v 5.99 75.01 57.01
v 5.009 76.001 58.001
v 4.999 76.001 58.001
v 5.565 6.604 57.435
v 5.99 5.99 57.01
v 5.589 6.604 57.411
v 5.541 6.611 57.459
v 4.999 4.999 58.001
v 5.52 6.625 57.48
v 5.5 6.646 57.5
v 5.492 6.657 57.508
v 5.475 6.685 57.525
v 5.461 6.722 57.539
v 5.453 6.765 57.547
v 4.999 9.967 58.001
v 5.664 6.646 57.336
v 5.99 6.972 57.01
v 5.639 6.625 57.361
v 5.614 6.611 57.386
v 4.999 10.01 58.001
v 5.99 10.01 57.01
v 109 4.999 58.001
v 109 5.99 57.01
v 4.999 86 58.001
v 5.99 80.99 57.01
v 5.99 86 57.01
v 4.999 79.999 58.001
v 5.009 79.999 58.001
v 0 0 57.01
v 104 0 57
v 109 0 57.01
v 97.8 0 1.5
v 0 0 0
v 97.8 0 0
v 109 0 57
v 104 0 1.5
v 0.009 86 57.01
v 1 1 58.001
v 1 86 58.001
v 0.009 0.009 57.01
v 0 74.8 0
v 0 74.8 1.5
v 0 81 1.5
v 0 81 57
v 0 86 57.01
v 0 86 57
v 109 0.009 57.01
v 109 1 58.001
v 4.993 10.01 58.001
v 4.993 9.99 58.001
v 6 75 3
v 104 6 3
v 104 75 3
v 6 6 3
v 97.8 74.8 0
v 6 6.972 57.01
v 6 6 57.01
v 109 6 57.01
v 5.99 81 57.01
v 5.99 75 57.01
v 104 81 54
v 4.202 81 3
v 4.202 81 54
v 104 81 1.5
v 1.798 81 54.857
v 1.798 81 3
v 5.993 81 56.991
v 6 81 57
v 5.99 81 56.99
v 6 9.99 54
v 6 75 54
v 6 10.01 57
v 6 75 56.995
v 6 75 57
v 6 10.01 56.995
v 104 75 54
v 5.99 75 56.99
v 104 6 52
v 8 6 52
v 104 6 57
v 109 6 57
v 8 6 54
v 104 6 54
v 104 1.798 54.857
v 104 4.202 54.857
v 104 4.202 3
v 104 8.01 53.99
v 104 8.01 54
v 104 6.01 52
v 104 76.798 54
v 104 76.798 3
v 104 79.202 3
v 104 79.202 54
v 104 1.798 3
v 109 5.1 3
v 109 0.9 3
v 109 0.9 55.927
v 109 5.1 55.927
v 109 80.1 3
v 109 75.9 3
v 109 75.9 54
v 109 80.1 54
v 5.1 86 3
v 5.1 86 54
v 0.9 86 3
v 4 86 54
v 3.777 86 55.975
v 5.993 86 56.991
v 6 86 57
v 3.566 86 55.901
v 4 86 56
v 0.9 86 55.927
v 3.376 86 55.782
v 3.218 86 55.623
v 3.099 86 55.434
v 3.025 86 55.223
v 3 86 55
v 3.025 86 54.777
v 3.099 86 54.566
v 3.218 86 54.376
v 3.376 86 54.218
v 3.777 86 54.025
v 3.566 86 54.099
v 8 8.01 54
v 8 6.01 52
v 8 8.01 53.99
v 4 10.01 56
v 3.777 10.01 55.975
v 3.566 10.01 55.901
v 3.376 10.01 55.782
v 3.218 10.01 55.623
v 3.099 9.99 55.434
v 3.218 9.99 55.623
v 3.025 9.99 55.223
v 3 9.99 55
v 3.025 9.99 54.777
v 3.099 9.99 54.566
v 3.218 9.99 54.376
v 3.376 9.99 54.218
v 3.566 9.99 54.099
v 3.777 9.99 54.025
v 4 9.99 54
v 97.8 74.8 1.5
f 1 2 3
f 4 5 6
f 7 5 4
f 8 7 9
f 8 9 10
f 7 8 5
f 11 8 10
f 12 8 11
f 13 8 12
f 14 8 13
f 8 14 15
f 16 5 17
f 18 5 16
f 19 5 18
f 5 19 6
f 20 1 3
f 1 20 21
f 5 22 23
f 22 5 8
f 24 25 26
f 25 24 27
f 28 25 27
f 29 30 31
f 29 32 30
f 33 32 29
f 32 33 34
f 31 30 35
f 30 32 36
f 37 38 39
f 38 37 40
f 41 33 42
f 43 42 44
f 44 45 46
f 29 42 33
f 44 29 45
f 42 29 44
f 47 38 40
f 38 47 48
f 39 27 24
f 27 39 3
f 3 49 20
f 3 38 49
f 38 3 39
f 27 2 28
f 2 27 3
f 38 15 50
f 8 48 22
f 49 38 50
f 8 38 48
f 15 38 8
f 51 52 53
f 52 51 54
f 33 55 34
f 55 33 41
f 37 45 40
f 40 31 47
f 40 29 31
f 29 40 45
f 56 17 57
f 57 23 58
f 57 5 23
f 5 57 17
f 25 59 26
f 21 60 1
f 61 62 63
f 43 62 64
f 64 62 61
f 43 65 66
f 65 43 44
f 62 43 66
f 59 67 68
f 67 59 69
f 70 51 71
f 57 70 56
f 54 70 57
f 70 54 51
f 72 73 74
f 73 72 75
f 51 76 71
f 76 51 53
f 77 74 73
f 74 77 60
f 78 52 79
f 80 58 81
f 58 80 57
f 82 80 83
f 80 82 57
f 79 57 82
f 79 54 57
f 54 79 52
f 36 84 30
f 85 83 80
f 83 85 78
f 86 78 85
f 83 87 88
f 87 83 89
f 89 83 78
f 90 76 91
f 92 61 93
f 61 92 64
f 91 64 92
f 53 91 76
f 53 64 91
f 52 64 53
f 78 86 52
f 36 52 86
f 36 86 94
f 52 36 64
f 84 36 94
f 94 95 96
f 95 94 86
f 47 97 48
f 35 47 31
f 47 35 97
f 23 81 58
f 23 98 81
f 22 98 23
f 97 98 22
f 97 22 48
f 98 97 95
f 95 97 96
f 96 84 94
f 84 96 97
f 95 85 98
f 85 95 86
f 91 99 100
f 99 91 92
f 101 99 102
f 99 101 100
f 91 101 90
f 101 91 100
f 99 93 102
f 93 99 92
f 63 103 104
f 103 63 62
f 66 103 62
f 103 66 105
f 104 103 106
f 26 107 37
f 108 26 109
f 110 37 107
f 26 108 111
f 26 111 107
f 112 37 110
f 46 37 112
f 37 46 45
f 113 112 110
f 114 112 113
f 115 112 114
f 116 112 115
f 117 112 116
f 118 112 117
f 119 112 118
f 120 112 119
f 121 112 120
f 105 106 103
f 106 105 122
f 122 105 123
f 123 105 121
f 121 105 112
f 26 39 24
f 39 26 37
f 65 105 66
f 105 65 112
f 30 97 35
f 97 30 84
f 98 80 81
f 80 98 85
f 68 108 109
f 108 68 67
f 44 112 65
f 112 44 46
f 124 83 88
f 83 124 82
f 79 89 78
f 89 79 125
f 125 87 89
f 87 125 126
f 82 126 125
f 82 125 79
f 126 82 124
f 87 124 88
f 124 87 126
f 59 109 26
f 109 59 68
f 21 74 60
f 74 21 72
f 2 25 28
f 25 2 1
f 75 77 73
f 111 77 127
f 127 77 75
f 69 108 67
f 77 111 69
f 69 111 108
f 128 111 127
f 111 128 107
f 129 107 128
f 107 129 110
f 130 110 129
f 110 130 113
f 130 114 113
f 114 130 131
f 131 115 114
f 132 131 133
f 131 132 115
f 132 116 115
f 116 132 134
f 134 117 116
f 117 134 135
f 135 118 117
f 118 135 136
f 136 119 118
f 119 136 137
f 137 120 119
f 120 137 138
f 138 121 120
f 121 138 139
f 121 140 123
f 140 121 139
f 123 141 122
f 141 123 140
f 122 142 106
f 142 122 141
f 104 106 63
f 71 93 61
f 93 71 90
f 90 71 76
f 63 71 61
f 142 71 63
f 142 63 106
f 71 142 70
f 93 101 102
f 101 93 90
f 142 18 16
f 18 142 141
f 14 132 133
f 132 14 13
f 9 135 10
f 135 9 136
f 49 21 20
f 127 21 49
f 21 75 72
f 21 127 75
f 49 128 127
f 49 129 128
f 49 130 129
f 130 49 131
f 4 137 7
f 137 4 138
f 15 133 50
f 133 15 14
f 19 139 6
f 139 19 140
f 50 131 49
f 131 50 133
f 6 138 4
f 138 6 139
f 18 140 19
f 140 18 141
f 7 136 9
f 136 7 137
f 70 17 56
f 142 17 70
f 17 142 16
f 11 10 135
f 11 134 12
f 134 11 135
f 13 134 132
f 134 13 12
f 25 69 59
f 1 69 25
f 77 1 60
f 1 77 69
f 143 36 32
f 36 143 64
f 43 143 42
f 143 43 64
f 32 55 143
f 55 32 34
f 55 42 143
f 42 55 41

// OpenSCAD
// ============================================================================
// cutlery_box.scad
// Graduated 3-chamber disposable-cutlery box (Option 3) — CUT-FROM-SOLID port
// of build_box.py, for a 120 x 120 x 120 mm printer (AOSEED).
//
// WHY THIS PORT EXISTS (the whole point):
//   The hand-mesh generator (build_box.py) could not keep the 1 mm rim chamfer
//   continuous across the female dovetail joints, because where a slot's flared
//   corner crosses the sloped chamfer it needs a true boolean intersection.
//   OpenSCAD HAS that boolean kernel, so here we do exactly the "cut-from-solid"
//   thing:
//      1. Build the ENTIRE box as ONE solid, WITH the chamfer already on it.
//      2. difference() out vertical dovetail prisms ( /_\ cross-section ),
//         running from just above the base plate up THROUGH the rim, to both
//         (a) form the sliding-dovetail joints, and
//         (b) split the box into 6 bed-sized pieces.
//   Because the cut is a real boolean through the already-chamfered solid, the
//   sloped chamfer<->slot edge is produced for free => the rim chamfer stays
//   CONTINUOUS across every joint, with none of the sliver hacks.
//
// ----------------------------------------------------------------------------
// HOW TO USE
//   In the app:  set `part` below (or use the Customizer dropdown), F5 to
//                preview, F6 to render, then File > Export > STL.
//   One piece (CLI):
//      openscad -o body_knife_A.stl -D 'part="knife_A"' cutlery_box.scad
//   ALL SIX (bash, run from this folder):
//      for p in knife_A knife_B fork_A fork_B spoon_A spoon_B; do \
//        openscad -o "body_$p.stl" -D "part=\"$p\"" cutlery_box.scad ; done
//   PNG preview of one piece:
//      openscad -o knife_B.png --imgsize=1400,1000 --autocenter --viewall \
//        -D 'part="knife_B"' cutlery_box.scad
//
//   Pieces are modelled in ASSEMBLED coordinates (floor-down, z=0 is the bed),
//   so importing all six STLs together shows the assembled box directly; your
//   slicer will auto-drop each one onto the plate for printing.
//
// BED SANITY: every piece is <= 120 mm in X, Y, Z.
//   Z = 58 mm. Widest piece = spoon at 117 mm (Y). A-halves reach 109 mm (X,
//   including the protruding dovetail key). All under 120.
//
// !! I could NOT run OpenSCAD to verify this file (no binary in my sandbox) !!
//   - The rim chamfer is a SMOOTH, true-45 bevel built from hull() frustums of
//     convex rectangles. Works in every OpenSCAD since ~2015 (incl. Homebrew
//     2021.01). No stepped staircase -- and, crucially, it makes box() a clean
//     well-formed solid so the per-part booleans resolve reliably (the old
//     14-slice staircase was fragile and CGAL was dropping the walls of the
//     interior parts, leaving only the key prisms => "floating boxes").
//   - roof() is still available behind USE_ROOF=true for those who have it
//     (2021.01+ snapshots); for THIS rectangular design it is identical, so it
//     is NOT required.
//   - After F6, check the console for "WARNING"/"not a valid 2-manifold".
//     If a tenon ever looks detached, bump EPS to 0.05.
// ============================================================================


/* [Part to render / export] */
part = "knife_A"; // [knife_A, knife_B, fork_A, fork_B, spoon_A, spoon_B, assembly]

/* [Chamfer method] */
// false = smooth hull() frustum bevel (default, any OpenSCAD); true = roof() (2021.01+)
USE_ROOF = false;

/* [Heights (mm)] */
BASE   = 3.0;     // floor / base-plate thickness
COMP_H = 55.0;    // interior wall height above the floor (cutlery stack depth)

/* [Walls (mm)] */
HOST_T   = 6.0;     // thickness of every wall (thick enough to host a dovetail)
HALF_LEN = 104.0;   // printed length of each half (A = near, B = far); <120 incl. key

/* [Chamber bays (mm)] */
N_COL     = 3;       // columns of cutlery per chamber
KNIFE_COL = 23.0;    // -> knife bay 69  (3 x 19 mm knives + play)
FORK_COL  = 33.0;    // -> fork  bay 99  (3 x 29 mm forks  + play)
SPOON_COL = 37.0;    // -> spoon bay 111 (3 x 34 mm spoons + play, trimmed <120)

/* [Dovetail joint (mm)] */
DT_DEPTH = 5.0;   // tail protrusion past the seam (male key depth)
DT_NECK  = 1.2;   // half-width at the seam face (narrow)
DT_FLARE = 2.1;   // half-width at the tip (wide -> locks)
DT_CLR   = 0.4;   // FLANK/seam slide clearance added to the female socket (do not change for fit)
DT_DEPTH_RELIEF = 0.3; // extra depth on the socket BACK only, so the tail tip never bottoms out

/* [Hidden-dovetail top cap / "hat" (mm)] */
// The dovetail otherwise shows its trapezoid outline on the TOP edge of the wall.
// To hide it, the MALE piece extends the wall's full-width top (chamfer included)
// across the key footprint -> a flush, continuous top. The FEMALE piece gets a
// matching top RECESS (cap footprint + CAP_CLR) so the cap drops straight in.
// Result: the top reads as one surface with a single straight seam line at the cap
// tip; the dovetail joinery lives entirely below the cap.
//
// SELF-SUPPORTING UNDERSIDE: the cap reaches the FULL wall width at the chamfer base
// (so the top edge reads as the wall extended, with NO recessed sliver on the outer
// face), and its underside is ONE planar ramp from the chamfer's OUTER CORNER
// (half-width HOST_T/2 at z = BODY_H-CHAMFER) down to the dovetail-neck half-width
// (CAP_FOOT) at CAP_SLANT_DEG from horizontal. No little horizontal step. The ramp
// reaching full width exactly at the chamfer base means "ramp top" == "chamfer base"
// (CAP_H is DERIVED). The FEMALE recess is the same ramp + CAP_CLR play.
// TRADEOFF: because the cap runs all the way to the outer corner, the female wall
// tapers to ~0 at z = BODY_H-CHAMFER -> a thin feather edge at the joint (gradual at
// CAP_SLANT_DEG, hidden inside the joint when assembled). Accepted per design intent.
CAP_SLANT_DEG = 50;     // cap underside ramp angle from horizontal (50 = self-supporting, long flare)
CAP_FOOT = DT_NECK;     // cap-underside half-width where it meets the dovetail neck
CAP_CLR = 0.3;          // slide clearance so the male cap seats into the female top recess

/* [Rim chamfer (mm)] */
CHAMFER = 1.0;    // 45-deg comfort break broken along the top wall edges

/* [Base half-lap / anti-warp (mm)] */
// Neighbouring base plates overlap as a HORIZONTAL half-lap (shiplap) at mid-base
// height, so corners stay coplanar (no lift/protrusion). Horizontal lap faces do
// NOT bind the vertical-drop assembly. Shingle direction: A->B and knife->fork->spoon.
LAP_LEN = 6;        // overlap past the A/B seam and the knife/fork seam
LAP_LEN_FS = 2;     // overlap past the fork/SPOON seam -- SMALLER: spoon is the
                    // tightest piece (117mm of the 120mm bed); a 6mm lap there
                    // would push spoon to 123mm. 2mm keeps spoon at 119mm.
LAP_Z   = BASE/2;   // 1.5 -- horizontal split height of the lap (bottom vs top half)
LAP_CLR = 0.2;      // in-plane clearance so the shelf isn't a press fit

/* [Lid — box features that receive a flat ORDERED clear sheet] */
// The lid itself is NOT printed: it's a flat ~2 mm PETG/Tritan sheet, bullnose-polished
// edges (r=LID_EDGE_R), ordered to size. We only model the box features that receive it.
LID_T            = 2.0;   // ordered sheet thickness
LID_EDGE_R       = 1.0;   // ordered sheet bullnose edge radius (for the sheet order spec)
LID_PLAY         = 0.4;   // total vertical play in the hinge groove (sheet + this)
LID_RECESS       = 2.0;   // lid TOP sits this far BELOW the rim, so the journal pocket is fully
                          // capped (rim caps the bullnose -> retains the lid when raised; tilt-in)
HINGE_AT_MINUS_X = true;  // hinge on the -x (303mm) end wall; clip on +x. (flip = mirror; default delivered)
// perimeter support ledge (lid underside rests on it at z = BODY_H-LID_T)
LEDGE_W          = 2.0;   // ledge inward protrusion (its underside ramps back at 45 deg -> self-supporting)
GROOVE_END_INSET = 0.0;   // groove reaches the corners but RUNS OUT smoothly there (no end-face / no
                          // exposed bore); GROOVE_TAPER sets the run-out length
GROOVE_TAPER     = 4.0;   // y-length over which the eased mouth tapers out at each groove end
// hinge journal (cut into the inner face of the hinge end wall, CONTINUOUS along the long edge)
GROOVE_DEPTH     = 3.0;   // 2mm lead-in slot + 1mm pocket radius -> journal sits 2mm back from the
                          // face so its cap clears the swing relief and RETAINS the lid
GROOVE_POCKET_R  = 1.0;   // journal half-cylinder radius (the bullnose sheet edge rolls in it)
// clip latch (one localized retainer, centered on the clip end wall)
CLIP_W           = 18.0;  // clip width
CLIP_LIP         = 0.4;   // retaining overhang (0.3 light .. 0.6 firm)
CLIP_RAMP_H      = 1.6;   // cam-ramp height above the rim (press-to-close)
// finger scallop (semicircular dish in the rim, centered on & aligned with the clip)
SCALLOP_W        = 16.0;  // scallop width
SCALLOP_DEPTH    = 6.0;   // how far it dishes down from the rim


/* [Hidden] */
EPS      = 0.01;          // tiny overlap so abutting solids fuse cleanly in CGAL
// Upper-chamber pieces (fork, spoon) were cut by a cell plane laid EXACTLY on the
// divider wall's far face (the lower chamber owns that wall). intersection() along a
// plane coincident with an existing box face makes CGAL leave a ZERO-THICKNESS copy
// of the wall face -> edge-manifold + "watertight" but degenerate (OpenSCAD shows it
// as a blue back-face; Tinkercad thickens it into a phantom block). SEAM_EPS nudges
// those cut planes a hair INTO the open bay so they no longer coincide with any box
// face -> no flap. 0.02 mm is physically nothing but is well clear of CGAL's tolerance.
SEAM_EPS = 0.02;
CUT_OVER = 1.0;           // how far dovetail cutters overshoot the rim (clean cut)

BODY_H    = BASE + COMP_H;     // 58  total height
END_WALL  = HOST_T;            // end walls are dovetail hosts too -> equally thick
TOTAL_LEN = 2 * HALF_LEN;      // 208 assembled length (end wall .. end wall)

// hidden-cap ramp geometry (derived).
//   CAP_HW    = cap MAX half-width = HOST_T/2 (the full wall edge) at the chamfer base.
//   CAP_RISE  = vertical height of the self-supporting CAP_SLANT_DEG underside ramp.
//   CAP_ZRAMP = where the cap reaches full width = the chamfer base (BODY_H-CHAMFER), so
//               the ramp runs straight to the chamfer OUTER CORNER (no horizontal step).
//   CAP_ZBOT  = cap bottom = ramp start; CAP_H derived from it (for reference/report).
//   CAP_ZRAMP_R = recess ramp top, shifted down by CAP_CLR so the recess ramp stays
//               parallel to the cap ramp with uniform play.
CAP_HW      = HOST_T/2;   // cap reaches the FULL wall edge at the chamfer base
CAP_RISE    = (CAP_HW - CAP_FOOT) * tan(CAP_SLANT_DEG);
CAP_ZRAMP   = BODY_H - CHAMFER;               // full width exactly at the chamfer base / outer corner
CAP_ZBOT    = CAP_ZRAMP - CAP_RISE;
CAP_H       = BODY_H - CAP_ZBOT;              // derived; reported
CAP_ZRAMP_R = CAP_ZRAMP;   // recess ramp ALSO tops at the chamfer corner (mirror the cap) -> no vertical lip
// sanity checks
assert(CAP_ZBOT > BASE + 1,
       "cap zone dips too low -- raise CAP_SLANT_DEG");
assert(CAP_HW >= DT_FLARE,
       "cap too narrow to cover the dovetail tail");

// NOTE: lid-derived constants are defined BELOW the Y-layout block, because some of
// them (INTERIOR_Y0/Y1, CLIP_CY) depend on OUTER_L / OUTER_R / EXT_W. See "lid derived".

// bay widths
KNIFE_BAY = N_COL * KNIFE_COL; // 69
FORK_BAY  = N_COL * FORK_COL;  // 99
SPOON_BAY = N_COL * SPOON_COL; // 111

// ---- Y layout (width direction): wall | bay | divider | bay | divider | bay | wall
KNIFE_Y0 = 0;
KNIFE_Y1 = HOST_T + KNIFE_BAY + HOST_T;        // 0..81   (outer wall + bay + divider)
FORK_Y0  = KNIFE_Y1;                           // 81
FORK_Y1  = FORK_Y0 + FORK_BAY + HOST_T;        // 81..186 (bay + divider)
SPOON_Y0 = FORK_Y1;                            // 186
SPOON_Y1 = SPOON_Y0 + SPOON_BAY + HOST_T;      // 186..303(bay + outer wall)
EXT_W    = SPOON_Y1;                           // 303 total width

// lengthwise wall Y-bands [y0,y1] (host the A/B dovetails) + their centers
OUTER_L  = [0, HOST_T];                                       // [0,6]    c=3
DIV_KF   = [HOST_T + KNIFE_BAY, HOST_T + KNIFE_BAY + HOST_T]; // [75,81]  c=78
DIV_FS   = [FORK_Y0 + FORK_BAY, FORK_Y0 + FORK_BAY + HOST_T]; // [180,186]c=183
OUTER_R  = [SPOON_Y1 - HOST_T, SPOON_Y1];                     // [297,303]c=300

// ---- lid derived ---- (placed AFTER OUTER_L/OUTER_R/EXT_W so nothing is forward-referenced)
LID_TOP_Z   = BODY_H - LID_RECESS;        // 56  lid TOP (recessed); rim z=58 rises LID_RECESS above it
LID_Z_UNDER = LID_TOP_Z - LID_T;          // 54  lid underside / ledge top / lowered-divider top
POCKET_CZ   = LID_TOP_Z - LID_T/2;        // 55  journal centre (lid mid) -> pocket top = LID_TOP_Z = capped
// hinge end-wall inner face x + inward direction; clip end-wall inner face x + inward dir
HINGE_INX   = HINGE_AT_MINUS_X ? END_WALL : TOTAL_LEN - END_WALL;       // 6  (default)
HINGE_IN    = HINGE_AT_MINUS_X ? 1 : -1;  // interior direction from the hinge wall (+x default)
CLIP_INX    = HINGE_AT_MINUS_X ? TOTAL_LEN - END_WALL : END_WALL;       // 202 (default)
CLIP_IN     = HINGE_AT_MINUS_X ? -1 : 1;  // interior direction from the clip wall (-x default)
POCKET_CX   = HINGE_INX - HINGE_IN*(GROOVE_DEPTH - GROOVE_POCKET_R);    // 5  pocket centre x (INTO the wall)
INTERIOR_Y0 = OUTER_L[1];                 // 6   inner face of the -y short wall
INTERIOR_Y1 = OUTER_R[0];                 // 297 inner face of the +y short wall
CLIP_CY     = EXT_W/2;                     // 151.5 clip/scallop centre (in the fork chamber)
assert(POCKET_CZ - GROOVE_POCKET_R > BASE + 1,
       "journal dips too low -- reduce LID_RECESS or LID_T");
assert(POCKET_CZ + GROOVE_POCKET_R <= LID_TOP_Z + EPS,
       "journal not capped -- lower the lid (raise LID_RECESS) or shrink GROOVE_POCKET_R");
// NOTE: with LID_RECESS the lid underside (and lowered dividers) sit BELOW CAP_ZBOT. That is
// intended: the inner dividers are cut flat below the cap zone (their hidden caps are removed,
// but the lid covers them); the perimeter/end-wall caps are untouched (full-height walls).

// the three OPEN bays are rectangular holes in the wall footprint:
//   footprint = outer rectangle MINUS these bays  (== the 6 walls; verified).
// The smooth chamfer is built from exactly this decomposition.
BAY_X0 = END_WALL;              // 6
BAY_X1 = TOTAL_LEN - END_WALL;  // 202
BAYS = [
    [BAY_X0, BAY_X1, HOST_T,   HOST_T + KNIFE_BAY],   // knife bay [6,202] x [6,75]
    [BAY_X0, BAY_X1, FORK_Y0,  FORK_Y0 + FORK_BAY],   // fork  bay [6,202] x [81,180]
    [BAY_X0, BAY_X1, SPOON_Y0, SPOON_Y0 + SPOON_BAY], // spoon bay [6,202] x [186,297]
];

YC_OUTL  = OUTER_L[0] + HOST_T/2;   // 3   outer-left wall center
YC_DIVKF = DIV_KF[0]  + HOST_T/2;   // 78  knife/fork divider center
YC_DIVFS = DIV_FS[0]  + HOST_T/2;   // 183 fork/spoon divider center
YC_OUTR  = OUTER_R[0] + HOST_T/2;   // 300 outer-right wall center

// seams
AB_SEAM = HALF_LEN;               // 104  A/B length seam (x)
SEAM_KF = FORK_Y0;                // 81   knife/fork width seam (y)
SEAM_FS = SPOON_Y0;              // 186  fork/spoon width seam (y)
ENDC_A  = END_WALL/2;             // 3    A end-wall center (x) -> chamber dovetails
ENDC_B  = TOTAL_LEN - END_WALL/2; // 205  B end-wall center (x)


// ============================================================================
// 2D wall footprint (cross-section of all walls, constant in z for the straight
// part). Union of: 2 full-width end walls + 4 lengthwise walls between them.
// ============================================================================
module wall_footprint_2d() {
    // footprint = outer rectangle minus the 3 open bays  (== the 6 walls)
    difference() {
        square([TOTAL_LEN, EXT_W]);
        for (b = BAYS) translate([b[0], b[2]]) square([b[1] - b[0], b[3] - b[2]]);
    }
}

// ============================================================================
// The full chamfered box solid = base plate + walls with a continuous 1 mm
// top-rim chamfer. Built ONCE; every piece is carved out of this.
// ============================================================================
module chamfer_cap() {
    // SMOOTH 45 rim chamfer over z[BODY_H-CHAMFER, BODY_H], in absolute coords.
    zm = BODY_H - CHAMFER;
    if (USE_ROOF) {
        // exact straight-skeleton roof, capped at CHAMFER height (needs roof()).
        intersection() {
            translate([0,0,zm]) roof() wall_footprint_2d();
            translate([0,0,zm]) linear_extrude(CHAMFER + EPS) wall_footprint_2d();
        }
    } else {
        // DEFAULT: true 45 bevel as hull() frustums of CONVEX rectangles -> smooth
        // AND a clean manifold.  Since footprint = outer - bays, the chamfer of the
        // footprint = (outer rectangle beveled inward) MINUS (each bay beveled so it
        // grows toward the top, which bevels every bay-facing rim).  All hull()s are
        // on convex rectangles, so nothing gets convex-filled.
        difference() {
            // outer perimeter frustum: full outer rect at zm -> inset by CHAMFER at top
            hull() {
                translate([0,0,zm])     linear_extrude(0.001) square([TOTAL_LEN, EXT_W]);
                translate([0,0,BODY_H]) linear_extrude(0.001) offset(delta=-CHAMFER) square([TOTAL_LEN, EXT_W]);
            }
            // each bay grows by CHAMFER toward the top -> bevels its surrounding rim.
            // (overshoots z a hair past both ends so the cut is clean.)
            for (b = BAYS)
                hull() {
                    translate([0,0,zm-EPS])     linear_extrude(0.001)
                        translate([b[0],b[2]]) offset(delta=-EPS)        square([b[1]-b[0], b[3]-b[2]]);
                    translate([0,0,BODY_H+EPS]) linear_extrude(0.001)
                        translate([b[0],b[2]]) offset(delta=CHAMFER+EPS) square([b[1]-b[0], b[3]-b[2]]);
                }
        }
    }
}

module box() {
    zm = BODY_H - CHAMFER;
    union() {
        cube([TOTAL_LEN, EXT_W, BASE]);                                        // base plate z[0,3]
        translate([0,0,BASE]) linear_extrude(zm - BASE + EPS) wall_footprint_2d(); // straight walls z[3,57]
        chamfer_cap();                                                         // smooth chamfer z[57,58]
    }
}

// ============================================================================
// Dovetail prisms ( /_\ ). Vertical, z[BASE, BODY_H+CUT_OVER] so they cut
// through the rim but leave the base plate continuous. The near face is pushed
// back EPS so a male key always fuses to its wall.
//   male key   : half_n=DT_NECK,         half_f=DT_FLARE
//   female slot: half_n=DT_NECK+DT_CLR,  half_f=DT_FLARE+DT_CLR
// ============================================================================
module dt_prism_X(seam_x, yc, half_n, half_f) {   // perpendicular to X, grows +X
    translate([0,0,BASE]) linear_extrude(BODY_H - BASE + CUT_OVER)
        polygon([[seam_x - EPS,        yc - half_n],
                 [seam_x + DT_DEPTH,   yc - half_f],
                 [seam_x + DT_DEPTH,   yc + half_f],
                 [seam_x - EPS,        yc + half_n]]);
}
module dt_prism_Y(seam_y, xc, half_n, half_f) {   // perpendicular to Y, grows +Y
    translate([0,0,BASE]) linear_extrude(BODY_H - BASE + CUT_OVER)
        polygon([[xc - half_n, seam_y - EPS],
                 [xc - half_f, seam_y + DT_DEPTH],
                 [xc + half_f, seam_y + DT_DEPTH],
                 [xc + half_n, seam_y - EPS]]);
}
module ab_key   (yc)        { dt_prism_X(AB_SEAM, yc, DT_NECK, DT_FLARE); }
module ch_key   (seam_y, xc){ dt_prism_Y(seam_y, xc, DT_NECK, DT_FLARE); }

// Female sockets = male + DT_CLR on the flanks/seam (unchanged), PLUS a straight
// back-face relief of DT_DEPTH_RELIEF so the tail tip never bottoms out. The
// relief is a rectangle tacked onto the trapezoid's tip at the SAME flare width,
// so the angled flank faces (and their 0.4 mm slide clearance) are untouched.
module ab_socket(yc) {
    dt_prism_X(AB_SEAM, yc, DT_NECK + DT_CLR, DT_FLARE + DT_CLR);
    translate([0,0,BASE]) linear_extrude(BODY_H - BASE + CUT_OVER)
        translate([AB_SEAM + DT_DEPTH, yc - (DT_FLARE + DT_CLR)])
            square([DT_DEPTH_RELIEF, 2*(DT_FLARE + DT_CLR)]);          // back relief, +X
}
module ch_socket(seam_y, xc) {
    dt_prism_Y(seam_y, xc, DT_NECK + DT_CLR, DT_FLARE + DT_CLR);
    translate([0,0,BASE]) linear_extrude(BODY_H - BASE + CUT_OVER)
        translate([xc - (DT_FLARE + DT_CLR), seam_y + DT_DEPTH])
            square([2*(DT_FLARE + DT_CLR), DT_DEPTH_RELIEF]);          // back relief, +Y
}

// ===== hidden-dovetail top cap ("hat"), SELF-SUPPORTING underside ===============
// MALE cap: a FULL-wall-width hat whose underside is ONE planar ramp from the chamfer's
// OUTER CORNER (half-width CAP_HW = HOST_T/2 at CAP_ZRAMP = BODY_H-CHAMFER) down to the
// dovetail-neck half-width (CAP_FOOT) at CAP_SLANT_DEG from horizontal -> the self-
// supporting shoulder, running straight to the corner (no horizontal step). Built as
// hull(narrow bottom slab buried in the tail neck, full-width top slab through the rim);
// box() trims it to the wall and adds the continuous rim chamfer for free, so the outer
// top edge reads as the wall extended (no recessed sliver). The protruding NOSE is left
// SQUARE (vertical) -- hidden in the female socket when assembled.
// TRADEOFF: the female wall tapers to ~0 at z=BODY_H-CHAMFER (a thin feather edge at the
// joint, gradual at CAP_SLANT_DEG) -- accepted per design intent.
module ab_cap(yc) {   // A/B seam, grows +X past the seam (length direction)
    hull() {
        translate([AB_SEAM - EPS, yc - CAP_FOOT, CAP_ZBOT])
            cube([DT_DEPTH + EPS, 2*CAP_FOOT, EPS]);
        translate([AB_SEAM - EPS, yc - CAP_HW,   CAP_ZRAMP])
            cube([DT_DEPTH + EPS, 2*CAP_HW, (BODY_H + CUT_OVER) - CAP_ZRAMP]);
    }
}
module ch_cap(seam_y, xc) {   // chamber seam, grows +Y past the seam (in the end wall)
    hull() {
        translate([xc - CAP_FOOT, seam_y - EPS, CAP_ZBOT])
            cube([2*CAP_FOOT, DT_DEPTH + EPS, EPS]);
        translate([xc - CAP_HW,   seam_y - EPS, CAP_ZRAMP])
            cube([2*CAP_HW, DT_DEPTH + EPS, (BODY_H + CUT_OVER) - CAP_ZRAMP]);
    }
}
// FEMALE recess: the SAME ramp grown by CAP_CLR (flanks, tip, floor, and ramp shifted down
// by CAP_CLR so it stays parallel) -> the cap seats with uniform slide clearance. It opens
// to the wall edge (and a hair past, into air) so the cap's full-width corner drops in;
// this is what leaves the thin female feather at the top (accepted). Open upward + toward seam.
module ab_cap_neg(yc) {
    hull() {
        translate([AB_SEAM - EPS, yc - (CAP_FOOT + CAP_CLR), CAP_ZBOT - CAP_CLR])
            cube([DT_DEPTH + CAP_CLR + EPS, 2*(CAP_FOOT + CAP_CLR), EPS]);
        translate([AB_SEAM - EPS, yc - (CAP_HW + EPS), CAP_ZRAMP_R])
            cube([DT_DEPTH + CAP_CLR + EPS, 2*(CAP_HW + EPS), (BODY_H + CUT_OVER + 1) - CAP_ZRAMP_R]);
    }
}
module ch_cap_neg(seam_y, xc) {
    hull() {
        translate([xc - (CAP_FOOT + CAP_CLR), seam_y - EPS, CAP_ZBOT - CAP_CLR])
            cube([2*(CAP_FOOT + CAP_CLR), DT_DEPTH + CAP_CLR + EPS, EPS]);
        translate([xc - (CAP_HW + EPS), seam_y - EPS, CAP_ZRAMP_R])
            cube([2*(CAP_HW + EPS), DT_DEPTH + CAP_CLR + EPS, (BODY_H + CUT_OVER + 1) - CAP_ZRAMP_R]);
    }
}

// rectangular cell (x[xa,xb], y[ya,yb], full height + margin) used to split pieces
module cell(xa, xb, ya, yb) {
    translate([xa, ya, -1]) cube([xb - xa, yb - ya, BODY_H + 11]);
}

// ===== base half-lap (shiplap) =================================================
// HORIZONTAL lap at mid-base height: the shelf-owner keeps its BOTTOM half
// (z 0..LAP_Z) extending LAP_LEN past the seam; the neighbour has its bottom half
// REMOVED there (keeps only the top half) and lands flat on the shelf. Horizontal
// faces => no binding during the vertical drop. Shelves live entirely in the base
// (z < BASE), well clear of the wall dovetails (z >= BASE).
// Shingle = FEMALE-first (matches the no-notch dovetail assembly order, which
// lowers the male piece onto the female): the B half owns the A/B shelf (grows
// -X into A) and the UPPER chamber (fork, spoon) owns the chamber shelf (grows
// -Y into the lower chamber).  Order: spoon, fork, knife; B before A.
module lap_shelf_X(y0, y1) {                 // B-side shelf, grows -X into A past AB_SEAM
    // +EPS past AB_SEAM so the shelf interpenetrates (not just abuts) its own B body -> fuses cleanly.
    translate([AB_SEAM - LAP_LEN, y0, 0]) cube([LAP_LEN + EPS, y1 - y0, LAP_Z]);
}
module lap_neg_X(y0, y1) {                   // A-side: remove bottom half to receive it
    translate([AB_SEAM - LAP_LEN - LAP_CLR, y0 - EPS, -EPS])
        cube([LAP_LEN + LAP_CLR + EPS, (y1 - y0) + 2*EPS, LAP_Z + EPS]);
}
module lap_shelf_Y(seam_y, x0, x1, ln=LAP_LEN) {   // upper-chamber shelf, grows -Y into lower
    // grows -Y by `ln` into the lower chamber AND +Y by 2*SEAM_EPS past the seam so it
    // always overlaps the (SEAM_EPS-nudged) body floor and stays fused -> no floating shelf.
    translate([x0, seam_y - ln, 0]) cube([x1 - x0, ln + 2*SEAM_EPS, LAP_Z]);
}
module lap_neg_Y(seam_y, x0, x1, ln=LAP_LEN) {     // lower-chamber: remove bottom half
    translate([x0 - EPS, seam_y - ln - LAP_CLR, -EPS])
        cube([(x1 - x0) + 2*EPS, ln + LAP_CLR + EPS, LAP_Z + EPS]);
}

// ============================================================================
// LID FEATURES (receive a flat ORDERED clear sheet; the sheet is not printed).
// All features live at the TOP (z >= ~52), ABOVE the dovetail engagement, the half-lap
// (z<1.5) and most of the hat, so the vertical-drop assembly and joints are untouched.
// EPS overlaps throughout; no coincident coplanar faces with the existing walls.
// Default orientation: HINGE on the -x end wall (A pieces), CLIP on the +x end wall
// (B pieces), clip+scallop centred on the fork (middle) chamber.
// ============================================================================

// --- perimeter support ledge: 45-deg self-supporting brackets; rest face at LID_Z_UNDER.
//     Runs along the CLIP end wall + the two short outer walls. (Hinge wall uses the groove.)
//     Built as hull(thin top edge, wall column) -> a triangular bracket whose underside is
//     a 45-deg ramp (prints floor-down with no support). ADDED to each piece (clipped by cell).
//     Each run is INSET by LEDGE_W from the perpendicular walls so the three brackets never
//     overlap at a corner and the wall's normal chamfer wraps every corner uninterrupted.
module lid_ledge() {
    cy0 = INTERIOR_Y0 + LEDGE_W;  cy1 = INTERIOR_Y1 - LEDGE_W;  cyl = cy1 - cy0;   // clip-run y span (inset)
    sx0 = END_WALL    + LEDGE_W;  sxl = (TOTAL_LEN - 2*END_WALL) - 2*LEDGE_W;       // short-run x span (inset)
    // clip end wall (x = CLIP_INX), bracket protrudes toward interior (CLIP_IN)
    hull() {
        translate([CLIP_INX + CLIP_IN*LEDGE_W, cy0, LID_Z_UNDER - EPS]) cube([EPS, cyl, EPS]);
        translate([CLIP_INX - EPS,             cy0, LID_Z_UNDER - LEDGE_W]) cube([2*EPS, cyl, LEDGE_W]);
    }
    // OUTER_L short wall (y = INTERIOR_Y0), bracket protrudes +y
    hull() {
        translate([sx0, INTERIOR_Y0 + LEDGE_W, LID_Z_UNDER - EPS]) cube([sxl, EPS, EPS]);
        translate([sx0, INTERIOR_Y0 - EPS,     LID_Z_UNDER - LEDGE_W]) cube([sxl, 2*EPS, LEDGE_W]);
    }
    // OUTER_R short wall (y = INTERIOR_Y1), bracket protrudes -y
    hull() {
        translate([sx0, INTERIOR_Y1 - LEDGE_W, LID_Z_UNDER - EPS]) cube([sxl, EPS, EPS]);
        translate([sx0, INTERIOR_Y1 - EPS,     LID_Z_UNDER - LEDGE_W]) cube([sxl, 2*EPS, LEDGE_W]);
    }
}

// --- hinge groove: ONE 2D cross-section (journal bore + lead-in slot + 45-deg swing ramp),
//     CAPPED at the recessed lid top (LID_TOP_Z), swept along the wall. At BOTH ends the whole
//     profile RUNS OUT smoothly -- it tapers to the inner-top rim corner (HINGE_INX, BODY_H) --
//     so there is NO end-face and NO exposed bore at the corners; the groove just fades into the
//     wall. The rim caps the bullnose (retains the lid, tilt-in); the 45-deg ramp is self-
//     supporting and gives the swing clearance; the cap stays full over the bullnose => retains.
module groove_profile() {                            // 2D cross-section in (x, z)
    union() {
        translate([POCKET_CX, POCKET_CZ]) circle(r = GROOVE_POCKET_R, $fn = 28);              // journal bore
        translate([POCKET_CX, LID_Z_UNDER]) square([HINGE_INX - POCKET_CX + EPS, LID_T]);     // lead-in slot
        polygon([[POCKET_CX, LID_TOP_Z], [HINGE_INX + EPS, LID_TOP_Z], [HINGE_INX + EPS, BODY_H - CHAMFER]]); // swing relief (below the rim chamfer)
        polygon([[HINGE_INX, BODY_H - CHAMFER], [HINGE_INX + EPS, BODY_H + EPS], [HINGE_INX - CHAMFER, BODY_H + EPS]]); // rim chamfer cut, CONTINUOUS through the divider junctions (no bulge)
    }
}
module groove_extrude(y0, y1) {                      // sweep the profile along the wall, y0..y1
    translate([0, y0, 0]) rotate([90,0,0]) translate([0,0,-(y1 - y0)]) linear_extrude(y1 - y0) groove_profile();
}
module groove_runout(yApex, yFull) {                 // groove fades to the inner-top rim corner at yApex
    hull() {
        groove_extrude(yFull - EPS, yFull + EPS);    // thin full-profile slice at yFull
        translate([HINGE_INX - EPS, yApex - EPS, BODY_H - EPS]) cube([2*EPS, 2*EPS, 2*EPS]);  // collapse to the inner-top rim corner
    }
}
module hinge_groove() {
    gy0 = INTERIOR_Y0 + GROOVE_END_INSET;            // 6   (reaches the corner; runs out there)
    gy1 = INTERIOR_Y1 - GROOVE_END_INSET;            // 297
    ro  = min(GROOVE_TAPER, (gy1 - gy0)/2 - EPS);    // run-out length at each end
    groove_extrude(gy0 + ro, gy1 - ro);              // full-depth middle
    groove_runout(gy0, gy0 + ro);                    // -y run-out (fades into the corner)
    groove_runout(gy1, gy1 - ro);                    // +y run-out
}

// --- lower the inner chamber dividers to the lid underside (mid-support, no sag).
//     Removes the divider top over the full length; outer walls keep full height.
module divider_lower() {
    // x-span is the CHAMBER BAY only [BAY_X0, BAY_X1] (+EPS overlap into the end walls so the
    // cut is manifold). The end/outer walls keep their full BODY_H tops; only the two INNER
    // dividers (DIV_KF, DIV_FS) are lowered.
    translate([BAY_X0 - EPS, DIV_KF[0], LID_Z_UNDER]) cube([BAY_X1 - BAY_X0 + 2*EPS, HOST_T, BODY_H - LID_Z_UNDER + CUT_OVER]);
    translate([BAY_X0 - EPS, DIV_FS[0], LID_Z_UNDER]) cube([BAY_X1 - BAY_X0 + 2*EPS, HOST_T, BODY_H - LID_Z_UNDER + CUT_OVER]);
}

// --- retaining clip (ADDED): a lip on the clip end wall, centred on CLIP_CY, that overhangs
//     the RECESSED lid top (LID_TOP_Z) by CLIP_LIP and holds it down. A lead-in ramp above the
//     lip (up to LID_TOP_Z+CLIP_RAMP_H, still below the rim) cams the lid under as it swings
//     closed. Anchored into the wall (x = CLIP_INX-CLIP_IN*HOST_T/2). Added AFTER the scallop
//     cut so the scallop never undercuts it. No longer protrudes above the rim.
module lid_clip() {
    translate([0, CLIP_CY - CLIP_W/2, 0]) rotate([90,0,0]) translate([0,0,-CLIP_W]) linear_extrude(CLIP_W)
        polygon([[CLIP_INX - CLIP_IN*HOST_T/2, LID_TOP_Z - 0.8],         // anchor low, into the wall (fuse)
                 [CLIP_INX + CLIP_IN*CLIP_LIP, LID_TOP_Z],               // lip tip: overhang over the lid top
                 [CLIP_INX + CLIP_IN*CLIP_LIP, LID_TOP_Z + 0.4],         // lip front
                 [CLIP_INX - CLIP_IN*HOST_T/2, LID_TOP_Z + CLIP_RAMP_H]]);// lead-in ramp up into the wall
}

// --- finger scallop (CUT): a semicircular dish in the rim's INNER edge at the clip, so a
//     fingertip reaches under the lid edge to release it. Interior half only (does not
//     touch the wall body or the clip's anchor).
module lid_scallop() {
    intersection() {
        translate([CLIP_INX, CLIP_CY, BODY_H - SCALLOP_DEPTH]) cylinder(h = SCALLOP_DEPTH + EPS, r = SCALLOP_W/2, $fn = 40);
        translate([CLIP_INX + (CLIP_IN<0 ? -SCALLOP_W : 0), CLIP_CY - SCALLOP_W, BODY_H - SCALLOP_DEPTH - EPS])
            cube([SCALLOP_W, 2*SCALLOP_W, SCALLOP_DEPTH + 2*EPS]);
    }
}

// ============================================================================
// The six pieces.  piece = intersection(box, cell + own male keys) - own sockets
//   A halves are MALE on the A/B seam (keep the key); B halves are FEMALE (slot).
//   On a chamber seam the LEFT chamber is male (+Y), the right chamber is female.
// ============================================================================
// Base half-lap shingling (FEMALE-first, Option 1):
//   A/B seam  -> the B half owns the bottom shelf (grows -X), A has the negative.
//   chamber   -> the UPPER chamber (fork, spoon) owns the shelf (grows -Y); the
//                lower chamber (knife, fork) has the negative.
//   Assembly order: spoon, fork, knife; B before A (male lowered onto female).
// Center crossings (104,81)&(104,186): the CHAMBER shelf (fork_A / spoon_A) owns the
//   crossing square; the B-half A/B shelf (knife_B / fork_B) is CLIPPED short of the
//   chamber seam by LAP_LEN so two shelves never collide.
module knife_A() {                                       // placed LAST; receives everything
    difference() {
        union() {
            intersection() {
                box();
                union() {
                    cell(-1, AB_SEAM, KNIFE_Y0 - 1, KNIFE_Y1);
                    ab_key(YC_OUTL); ab_key(YC_DIVKF); ch_key(SEAM_KF, ENDC_A);
                    ab_cap(YC_OUTL); ab_cap(YC_DIVKF); ch_cap(SEAM_KF, ENDC_A);  // hide tops (male)
                }
            }
            intersection() { lid_ledge(); cell(-1, AB_SEAM, KNIFE_Y0 - 1, KNIFE_Y1); }  // lid support ledge
        }
        lap_neg_X(KNIFE_Y0, KNIFE_Y1);            // receive knife_B's A/B shelf
        lap_neg_Y(SEAM_KF, 0, AB_SEAM);           // receive fork_A's chamber shelf
        hinge_groove(); divider_lower(); lid_scallop();   // lid cuts (groove hits A pieces; divider/scallop where present)
    }
}

module knife_B() {
    difference() {
        union() {
            intersection() {
                box();
                union() {
                    cell(AB_SEAM, TOTAL_LEN + 1, KNIFE_Y0 - 1, KNIFE_Y1);
                    ch_key(SEAM_KF, ENDC_B);
                    ch_cap(SEAM_KF, ENDC_B);                // hide top (male, chamber)
                }
            }
            lap_shelf_X(KNIFE_Y0, KNIFE_Y1 - LAP_LEN);  // A/B shelf -> knife_A (CLIPPED at y=81 crossing)
            intersection() { lid_ledge(); cell(AB_SEAM, TOTAL_LEN + 1, KNIFE_Y0 - 1, KNIFE_Y1); }  // lid support ledge
        }
        ab_socket(YC_OUTL); ab_socket(YC_DIVKF);
        ab_cap_neg(YC_OUTL); ab_cap_neg(YC_DIVKF);      // top recesses to receive knife_A's caps (female)
        lap_neg_Y(SEAM_KF, AB_SEAM, TOTAL_LEN);         // receive fork_B's chamber shelf
        hinge_groove(); divider_lower(); lid_scallop();   // lid cuts
    }
}

module fork_A() {
    difference() {
        union() {
            intersection() {
                box();
                union() {
                    cell(-1, AB_SEAM, FORK_Y0 + SEAM_EPS, FORK_Y1);  // -Y cut nudged off the divider face
                    ab_key(YC_DIVFS); ch_key(SEAM_FS, ENDC_A);
                    ab_cap(YC_DIVFS); ch_cap(SEAM_FS, ENDC_A);       // hide tops (male)
                }
            }
            lap_shelf_Y(SEAM_KF, 0, AB_SEAM);           // chamber shelf -> knife_A (owns crossing)
            intersection() { lid_ledge(); cell(-1, AB_SEAM, FORK_Y0 + SEAM_EPS, FORK_Y1); }  // lid support ledge (none in fork-A)
        }
        lap_neg_X(FORK_Y0, FORK_Y1);                    // receive fork_B's A/B shelf
        ch_socket(SEAM_KF, ENDC_A);
        ch_cap_neg(SEAM_KF, ENDC_A);                    // top recess to receive knife_A's chamber cap (female)
        lap_neg_Y(SEAM_FS, 0, AB_SEAM, LAP_LEN_FS);     // receive spoon_A's (small) chamber shelf
        hinge_groove(); divider_lower(); lid_scallop();   // lid cuts (groove = fork-A hinge segment; divider = DIV_FS)
    }
}

module fork_B() {
    union() {
        difference() {
            union() {
                intersection() {
                    box();
                    union() {
                        cell(AB_SEAM, TOTAL_LEN + 1, FORK_Y0 + SEAM_EPS, FORK_Y1);  // -Y cut nudged off the divider face
                        ch_key(SEAM_FS, ENDC_B);
                        ch_cap(SEAM_FS, ENDC_B);                // hide top (male, chamber)
                    }
                }
                lap_shelf_X(FORK_Y0, FORK_Y1 - LAP_LEN_FS); // A/B shelf -> fork_A (CLIPPED at y=186 crossing)
                lap_shelf_Y(SEAM_KF, AB_SEAM, TOTAL_LEN);   // chamber shelf -> knife_B
                intersection() { lid_ledge(); cell(AB_SEAM, TOTAL_LEN + 1, FORK_Y0 + SEAM_EPS, FORK_Y1); }  // lid ledge (clip-end run)
            }
            ab_socket(YC_DIVFS);
            ab_cap_neg(YC_DIVFS);                           // top recess to receive fork_A's A/B cap (female)
            ch_socket(SEAM_KF, ENDC_B);
            ch_cap_neg(SEAM_KF, ENDC_B);                    // top recess to receive knife_B's chamber cap (female)
            lap_neg_Y(SEAM_FS, AB_SEAM, TOTAL_LEN, LAP_LEN_FS); // receive spoon_B's (small) chamber shelf
            hinge_groove(); divider_lower(); lid_scallop();     // lid cuts (scallop lands here)
        }
        intersection() { lid_clip(); cell(AB_SEAM, TOTAL_LEN + 1, FORK_Y0 + SEAM_EPS, FORK_Y1); }  // retaining clip, added AFTER the scallop cut
    }
}

module spoon_A() {
    difference() {
        union() {
            intersection() {
                box();
                union() {
                    cell(-1, AB_SEAM, SPOON_Y0 + SEAM_EPS, SPOON_Y1 + 1);  // -Y cut nudged off the divider face
                    ab_key(YC_OUTR);
                    ab_cap(YC_OUTR);                        // hide top (male)
                }
            }
            lap_shelf_Y(SEAM_FS, 0, AB_SEAM, LAP_LEN_FS); // chamber shelf -> fork_A (small; owns crossing)
            intersection() { lid_ledge(); cell(-1, AB_SEAM, SPOON_Y0 + SEAM_EPS, SPOON_Y1 + 1); }  // lid support ledge (OUTER_R run)
        }
        lap_neg_X(SPOON_Y0, SPOON_Y1);                  // receive spoon_B's A/B shelf
        ch_socket(SEAM_FS, ENDC_A);
        ch_cap_neg(SEAM_FS, ENDC_A);                    // top recess to receive fork_A's chamber cap (female)
        hinge_groove(); divider_lower(); lid_scallop();   // lid cuts (groove = spoon-A hinge segment)
    }
}

module spoon_B() {                                      // placed FIRST; owns shelves
    difference() {
        union() {
            intersection() {
                box();
                union() {
                    cell(AB_SEAM, TOTAL_LEN + 1, SPOON_Y0 + SEAM_EPS, SPOON_Y1 + 1);  // -Y cut nudged off the divider face
                }
            }
            lap_shelf_X(SPOON_Y0, SPOON_Y1);            // A/B shelf -> spoon_A
            lap_shelf_Y(SEAM_FS, AB_SEAM, TOTAL_LEN, LAP_LEN_FS); // chamber shelf -> fork_B (small)
            intersection() { lid_ledge(); cell(AB_SEAM, TOTAL_LEN + 1, SPOON_Y0 + SEAM_EPS, SPOON_Y1 + 1); }  // lid ledge (OUTER_R + clip-end runs)
        }
        ab_socket(YC_OUTR);
        ab_cap_neg(YC_OUTR);                            // top recess to receive spoon_A's A/B cap (female)
        ch_socket(SEAM_FS, ENDC_B);
        ch_cap_neg(SEAM_FS, ENDC_B);                    // top recess to receive fork_B's chamber cap (female)
        hinge_groove(); divider_lower(); lid_scallop();   // lid cuts
    }
}

// Fast preview: the full continuous-chamfer box (no cuts). The six part modules
// above are the real, separable pieces. To instead see the TRUE assembled
// pieces with their joints (slower — 6 booleans), replace box(); below with:
//   knife_A(); knife_B(); fork_A(); fork_B(); spoon_A(); spoon_B();
module assembly() {
    box();
}

// ============================================================================
// Render dispatch
// ============================================================================
if      (part == "knife_A")  knife_A();
else if (part == "knife_B")  knife_B();
else if (part == "fork_A")   fork_A();
else if (part == "fork_B")   fork_B();
else if (part == "spoon_A")  spoon_A();
else if (part == "spoon_B")  spoon_B();
else if (part == "assembly") assembly();
else echo(str("Unknown part: ", part));
